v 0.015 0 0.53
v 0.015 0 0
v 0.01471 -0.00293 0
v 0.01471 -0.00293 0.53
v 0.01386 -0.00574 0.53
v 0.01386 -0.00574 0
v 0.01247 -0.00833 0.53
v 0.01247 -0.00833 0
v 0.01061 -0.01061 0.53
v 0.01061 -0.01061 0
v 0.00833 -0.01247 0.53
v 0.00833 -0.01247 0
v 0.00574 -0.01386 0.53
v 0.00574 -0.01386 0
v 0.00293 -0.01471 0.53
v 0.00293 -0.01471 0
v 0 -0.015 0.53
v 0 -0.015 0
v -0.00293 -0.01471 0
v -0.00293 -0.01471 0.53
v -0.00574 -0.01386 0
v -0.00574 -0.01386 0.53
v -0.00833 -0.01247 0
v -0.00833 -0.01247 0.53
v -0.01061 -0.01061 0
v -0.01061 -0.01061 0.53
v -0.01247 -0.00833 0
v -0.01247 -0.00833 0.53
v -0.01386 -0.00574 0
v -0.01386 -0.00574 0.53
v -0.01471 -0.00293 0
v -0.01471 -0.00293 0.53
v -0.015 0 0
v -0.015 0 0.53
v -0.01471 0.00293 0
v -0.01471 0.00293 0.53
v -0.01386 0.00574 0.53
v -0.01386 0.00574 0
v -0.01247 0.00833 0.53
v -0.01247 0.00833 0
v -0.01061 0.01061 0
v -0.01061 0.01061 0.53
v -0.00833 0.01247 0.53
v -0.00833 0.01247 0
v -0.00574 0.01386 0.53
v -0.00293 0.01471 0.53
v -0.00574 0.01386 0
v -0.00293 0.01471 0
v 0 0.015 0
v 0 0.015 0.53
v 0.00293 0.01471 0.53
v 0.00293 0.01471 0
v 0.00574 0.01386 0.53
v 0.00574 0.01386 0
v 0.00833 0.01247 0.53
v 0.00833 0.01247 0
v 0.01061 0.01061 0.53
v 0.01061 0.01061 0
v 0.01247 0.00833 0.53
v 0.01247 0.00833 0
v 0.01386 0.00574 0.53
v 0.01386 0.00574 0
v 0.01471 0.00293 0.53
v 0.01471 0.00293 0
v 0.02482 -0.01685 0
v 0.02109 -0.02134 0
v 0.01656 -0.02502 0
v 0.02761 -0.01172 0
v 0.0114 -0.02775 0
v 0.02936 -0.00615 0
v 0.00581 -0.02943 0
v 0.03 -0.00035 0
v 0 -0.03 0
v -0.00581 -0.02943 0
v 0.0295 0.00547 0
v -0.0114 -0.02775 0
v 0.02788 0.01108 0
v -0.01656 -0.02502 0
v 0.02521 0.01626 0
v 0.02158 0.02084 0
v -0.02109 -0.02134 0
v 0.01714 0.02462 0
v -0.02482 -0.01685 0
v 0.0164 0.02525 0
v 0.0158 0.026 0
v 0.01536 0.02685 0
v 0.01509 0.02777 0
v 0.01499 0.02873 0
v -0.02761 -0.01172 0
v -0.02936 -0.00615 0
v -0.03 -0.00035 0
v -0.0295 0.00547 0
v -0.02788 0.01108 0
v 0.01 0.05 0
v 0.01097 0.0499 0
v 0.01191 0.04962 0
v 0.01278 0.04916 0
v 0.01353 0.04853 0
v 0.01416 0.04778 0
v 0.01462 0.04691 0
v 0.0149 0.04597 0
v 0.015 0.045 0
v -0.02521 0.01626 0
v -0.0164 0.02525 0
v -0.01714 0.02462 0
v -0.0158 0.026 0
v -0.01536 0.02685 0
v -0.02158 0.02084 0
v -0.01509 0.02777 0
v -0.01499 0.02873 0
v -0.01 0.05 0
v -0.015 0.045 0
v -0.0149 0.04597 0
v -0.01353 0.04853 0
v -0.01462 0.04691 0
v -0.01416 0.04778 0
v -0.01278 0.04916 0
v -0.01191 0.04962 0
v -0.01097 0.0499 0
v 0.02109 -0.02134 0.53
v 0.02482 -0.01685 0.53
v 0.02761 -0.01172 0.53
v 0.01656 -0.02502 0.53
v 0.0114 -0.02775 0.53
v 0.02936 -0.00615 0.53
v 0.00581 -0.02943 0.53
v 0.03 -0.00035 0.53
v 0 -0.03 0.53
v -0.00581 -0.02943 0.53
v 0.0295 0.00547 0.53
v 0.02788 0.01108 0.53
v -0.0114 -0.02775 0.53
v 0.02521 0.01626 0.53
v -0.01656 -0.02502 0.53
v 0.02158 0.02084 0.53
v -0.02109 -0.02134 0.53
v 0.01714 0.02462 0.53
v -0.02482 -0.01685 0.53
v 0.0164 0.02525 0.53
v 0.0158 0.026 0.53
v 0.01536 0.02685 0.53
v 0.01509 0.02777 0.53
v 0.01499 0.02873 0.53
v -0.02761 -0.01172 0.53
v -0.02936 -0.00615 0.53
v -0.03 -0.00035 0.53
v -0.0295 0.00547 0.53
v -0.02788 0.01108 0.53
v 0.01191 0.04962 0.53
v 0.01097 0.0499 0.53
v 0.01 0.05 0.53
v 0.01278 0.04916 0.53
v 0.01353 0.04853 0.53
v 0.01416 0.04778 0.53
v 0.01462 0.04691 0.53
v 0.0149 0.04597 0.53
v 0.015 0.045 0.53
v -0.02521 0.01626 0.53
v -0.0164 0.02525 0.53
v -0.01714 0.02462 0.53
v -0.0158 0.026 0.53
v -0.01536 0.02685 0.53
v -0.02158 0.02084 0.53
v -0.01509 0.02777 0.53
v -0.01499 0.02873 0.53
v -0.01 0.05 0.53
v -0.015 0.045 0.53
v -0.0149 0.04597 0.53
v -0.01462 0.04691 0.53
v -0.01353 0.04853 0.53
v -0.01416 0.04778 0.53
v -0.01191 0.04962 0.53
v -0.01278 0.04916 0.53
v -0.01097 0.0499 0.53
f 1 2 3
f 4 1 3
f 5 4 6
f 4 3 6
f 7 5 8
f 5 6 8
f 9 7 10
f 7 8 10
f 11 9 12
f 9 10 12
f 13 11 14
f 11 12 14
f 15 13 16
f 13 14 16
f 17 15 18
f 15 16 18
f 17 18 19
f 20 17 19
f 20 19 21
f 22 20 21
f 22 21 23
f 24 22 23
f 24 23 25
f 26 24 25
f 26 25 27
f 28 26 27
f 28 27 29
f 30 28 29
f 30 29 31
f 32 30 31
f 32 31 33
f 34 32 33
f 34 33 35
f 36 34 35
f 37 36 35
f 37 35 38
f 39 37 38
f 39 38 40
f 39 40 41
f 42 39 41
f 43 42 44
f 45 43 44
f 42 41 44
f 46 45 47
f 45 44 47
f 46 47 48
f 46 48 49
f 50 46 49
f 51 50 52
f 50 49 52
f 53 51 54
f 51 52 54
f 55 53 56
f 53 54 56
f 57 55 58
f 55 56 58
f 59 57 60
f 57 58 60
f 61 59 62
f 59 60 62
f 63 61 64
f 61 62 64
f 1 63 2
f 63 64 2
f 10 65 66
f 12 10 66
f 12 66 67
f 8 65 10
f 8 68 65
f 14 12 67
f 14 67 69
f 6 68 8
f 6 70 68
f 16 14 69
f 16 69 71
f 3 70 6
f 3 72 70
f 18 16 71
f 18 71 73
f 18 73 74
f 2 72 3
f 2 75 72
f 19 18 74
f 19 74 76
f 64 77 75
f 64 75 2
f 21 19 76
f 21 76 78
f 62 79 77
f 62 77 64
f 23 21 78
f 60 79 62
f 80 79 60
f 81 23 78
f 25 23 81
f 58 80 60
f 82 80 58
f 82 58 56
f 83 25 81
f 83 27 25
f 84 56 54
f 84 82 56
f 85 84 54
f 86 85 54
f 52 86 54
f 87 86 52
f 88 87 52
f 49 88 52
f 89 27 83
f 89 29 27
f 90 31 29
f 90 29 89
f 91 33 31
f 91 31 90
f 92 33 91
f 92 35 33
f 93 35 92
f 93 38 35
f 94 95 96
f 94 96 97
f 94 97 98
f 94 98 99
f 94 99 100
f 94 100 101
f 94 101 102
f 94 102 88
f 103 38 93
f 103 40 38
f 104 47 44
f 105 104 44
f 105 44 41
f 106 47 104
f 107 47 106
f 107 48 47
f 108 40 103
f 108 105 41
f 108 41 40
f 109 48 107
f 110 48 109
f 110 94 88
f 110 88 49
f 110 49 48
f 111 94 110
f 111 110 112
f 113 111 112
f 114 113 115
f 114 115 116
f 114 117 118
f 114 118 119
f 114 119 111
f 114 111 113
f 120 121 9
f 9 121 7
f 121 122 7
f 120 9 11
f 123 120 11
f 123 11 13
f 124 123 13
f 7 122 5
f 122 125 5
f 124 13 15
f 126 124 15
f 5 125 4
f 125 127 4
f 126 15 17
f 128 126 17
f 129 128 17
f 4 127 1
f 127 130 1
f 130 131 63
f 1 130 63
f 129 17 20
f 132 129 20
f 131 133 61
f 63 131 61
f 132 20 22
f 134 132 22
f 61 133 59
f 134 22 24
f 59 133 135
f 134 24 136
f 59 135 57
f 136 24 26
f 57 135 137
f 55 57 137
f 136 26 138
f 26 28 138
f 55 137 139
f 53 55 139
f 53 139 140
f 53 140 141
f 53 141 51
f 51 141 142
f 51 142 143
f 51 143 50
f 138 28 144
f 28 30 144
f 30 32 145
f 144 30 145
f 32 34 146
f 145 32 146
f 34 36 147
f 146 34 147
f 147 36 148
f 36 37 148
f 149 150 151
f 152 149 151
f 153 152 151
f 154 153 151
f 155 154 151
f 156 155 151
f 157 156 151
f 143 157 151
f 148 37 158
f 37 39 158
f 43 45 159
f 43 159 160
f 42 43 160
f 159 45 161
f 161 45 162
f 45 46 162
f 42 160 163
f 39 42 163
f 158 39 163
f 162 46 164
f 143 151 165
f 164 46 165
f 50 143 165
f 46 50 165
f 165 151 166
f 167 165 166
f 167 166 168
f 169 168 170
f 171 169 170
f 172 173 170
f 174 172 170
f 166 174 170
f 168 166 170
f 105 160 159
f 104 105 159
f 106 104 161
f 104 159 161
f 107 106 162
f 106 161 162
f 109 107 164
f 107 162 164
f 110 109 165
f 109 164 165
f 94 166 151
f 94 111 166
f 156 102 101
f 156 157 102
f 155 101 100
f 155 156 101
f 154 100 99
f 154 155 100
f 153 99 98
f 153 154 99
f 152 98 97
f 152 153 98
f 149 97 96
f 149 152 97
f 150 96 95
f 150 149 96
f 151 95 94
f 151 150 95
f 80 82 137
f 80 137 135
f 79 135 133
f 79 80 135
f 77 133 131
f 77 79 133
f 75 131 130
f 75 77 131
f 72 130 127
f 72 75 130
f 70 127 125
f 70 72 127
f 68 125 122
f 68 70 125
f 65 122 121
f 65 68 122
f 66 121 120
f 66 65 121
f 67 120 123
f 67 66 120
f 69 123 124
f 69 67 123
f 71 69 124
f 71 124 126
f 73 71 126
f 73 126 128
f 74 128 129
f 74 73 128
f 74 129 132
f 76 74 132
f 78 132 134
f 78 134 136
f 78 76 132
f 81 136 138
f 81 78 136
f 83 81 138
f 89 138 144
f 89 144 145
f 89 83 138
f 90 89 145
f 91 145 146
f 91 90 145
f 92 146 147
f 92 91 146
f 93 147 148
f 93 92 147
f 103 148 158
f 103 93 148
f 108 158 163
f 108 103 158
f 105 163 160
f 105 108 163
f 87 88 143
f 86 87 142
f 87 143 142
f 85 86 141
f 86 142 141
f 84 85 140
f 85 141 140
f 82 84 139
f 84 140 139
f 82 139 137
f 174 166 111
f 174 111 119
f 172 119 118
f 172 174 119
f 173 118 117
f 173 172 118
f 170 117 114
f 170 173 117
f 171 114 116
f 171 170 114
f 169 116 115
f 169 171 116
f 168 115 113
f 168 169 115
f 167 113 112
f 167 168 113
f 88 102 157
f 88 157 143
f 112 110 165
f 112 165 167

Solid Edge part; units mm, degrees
sketch "Sketch1" plane through (0, 0, 0) normal (0, 0, 1) x (1, 0, 0)
  line L0 (-0.015, 0.026) -> (-0.015, 0.05)
  line L1 (-0.015, 0.05) -> (0.015, 0.05)
  line L2 (0.015, 0.05) -> (0.015, 0.026)
  arc A0 (0.015, 0.026) -> (-0.015, 0.026) centre (0, 0) cw
  dimension "D1" = 0.015
extrude "Protrusion1" add sketch "Sketch1" along normal blind 0.53
sketch "Sketch2" plane through (0, 0, 0) normal (0, 0, 1) x (1, 0, 0)
  circle A0 centre (0, 0) radius 0.015
  dimension "D1" = 0.03
extrude "Cutout1" cut sketch "Sketch2" along normal through all
fillet "Verrundung_1" radius 0.005 4 edges at (0.015, 0.026, 0.265) (0.015, 0.05, 0.265) (-0.015, 0.026, 0.265) (-0.015, 0.05, 0.265)
